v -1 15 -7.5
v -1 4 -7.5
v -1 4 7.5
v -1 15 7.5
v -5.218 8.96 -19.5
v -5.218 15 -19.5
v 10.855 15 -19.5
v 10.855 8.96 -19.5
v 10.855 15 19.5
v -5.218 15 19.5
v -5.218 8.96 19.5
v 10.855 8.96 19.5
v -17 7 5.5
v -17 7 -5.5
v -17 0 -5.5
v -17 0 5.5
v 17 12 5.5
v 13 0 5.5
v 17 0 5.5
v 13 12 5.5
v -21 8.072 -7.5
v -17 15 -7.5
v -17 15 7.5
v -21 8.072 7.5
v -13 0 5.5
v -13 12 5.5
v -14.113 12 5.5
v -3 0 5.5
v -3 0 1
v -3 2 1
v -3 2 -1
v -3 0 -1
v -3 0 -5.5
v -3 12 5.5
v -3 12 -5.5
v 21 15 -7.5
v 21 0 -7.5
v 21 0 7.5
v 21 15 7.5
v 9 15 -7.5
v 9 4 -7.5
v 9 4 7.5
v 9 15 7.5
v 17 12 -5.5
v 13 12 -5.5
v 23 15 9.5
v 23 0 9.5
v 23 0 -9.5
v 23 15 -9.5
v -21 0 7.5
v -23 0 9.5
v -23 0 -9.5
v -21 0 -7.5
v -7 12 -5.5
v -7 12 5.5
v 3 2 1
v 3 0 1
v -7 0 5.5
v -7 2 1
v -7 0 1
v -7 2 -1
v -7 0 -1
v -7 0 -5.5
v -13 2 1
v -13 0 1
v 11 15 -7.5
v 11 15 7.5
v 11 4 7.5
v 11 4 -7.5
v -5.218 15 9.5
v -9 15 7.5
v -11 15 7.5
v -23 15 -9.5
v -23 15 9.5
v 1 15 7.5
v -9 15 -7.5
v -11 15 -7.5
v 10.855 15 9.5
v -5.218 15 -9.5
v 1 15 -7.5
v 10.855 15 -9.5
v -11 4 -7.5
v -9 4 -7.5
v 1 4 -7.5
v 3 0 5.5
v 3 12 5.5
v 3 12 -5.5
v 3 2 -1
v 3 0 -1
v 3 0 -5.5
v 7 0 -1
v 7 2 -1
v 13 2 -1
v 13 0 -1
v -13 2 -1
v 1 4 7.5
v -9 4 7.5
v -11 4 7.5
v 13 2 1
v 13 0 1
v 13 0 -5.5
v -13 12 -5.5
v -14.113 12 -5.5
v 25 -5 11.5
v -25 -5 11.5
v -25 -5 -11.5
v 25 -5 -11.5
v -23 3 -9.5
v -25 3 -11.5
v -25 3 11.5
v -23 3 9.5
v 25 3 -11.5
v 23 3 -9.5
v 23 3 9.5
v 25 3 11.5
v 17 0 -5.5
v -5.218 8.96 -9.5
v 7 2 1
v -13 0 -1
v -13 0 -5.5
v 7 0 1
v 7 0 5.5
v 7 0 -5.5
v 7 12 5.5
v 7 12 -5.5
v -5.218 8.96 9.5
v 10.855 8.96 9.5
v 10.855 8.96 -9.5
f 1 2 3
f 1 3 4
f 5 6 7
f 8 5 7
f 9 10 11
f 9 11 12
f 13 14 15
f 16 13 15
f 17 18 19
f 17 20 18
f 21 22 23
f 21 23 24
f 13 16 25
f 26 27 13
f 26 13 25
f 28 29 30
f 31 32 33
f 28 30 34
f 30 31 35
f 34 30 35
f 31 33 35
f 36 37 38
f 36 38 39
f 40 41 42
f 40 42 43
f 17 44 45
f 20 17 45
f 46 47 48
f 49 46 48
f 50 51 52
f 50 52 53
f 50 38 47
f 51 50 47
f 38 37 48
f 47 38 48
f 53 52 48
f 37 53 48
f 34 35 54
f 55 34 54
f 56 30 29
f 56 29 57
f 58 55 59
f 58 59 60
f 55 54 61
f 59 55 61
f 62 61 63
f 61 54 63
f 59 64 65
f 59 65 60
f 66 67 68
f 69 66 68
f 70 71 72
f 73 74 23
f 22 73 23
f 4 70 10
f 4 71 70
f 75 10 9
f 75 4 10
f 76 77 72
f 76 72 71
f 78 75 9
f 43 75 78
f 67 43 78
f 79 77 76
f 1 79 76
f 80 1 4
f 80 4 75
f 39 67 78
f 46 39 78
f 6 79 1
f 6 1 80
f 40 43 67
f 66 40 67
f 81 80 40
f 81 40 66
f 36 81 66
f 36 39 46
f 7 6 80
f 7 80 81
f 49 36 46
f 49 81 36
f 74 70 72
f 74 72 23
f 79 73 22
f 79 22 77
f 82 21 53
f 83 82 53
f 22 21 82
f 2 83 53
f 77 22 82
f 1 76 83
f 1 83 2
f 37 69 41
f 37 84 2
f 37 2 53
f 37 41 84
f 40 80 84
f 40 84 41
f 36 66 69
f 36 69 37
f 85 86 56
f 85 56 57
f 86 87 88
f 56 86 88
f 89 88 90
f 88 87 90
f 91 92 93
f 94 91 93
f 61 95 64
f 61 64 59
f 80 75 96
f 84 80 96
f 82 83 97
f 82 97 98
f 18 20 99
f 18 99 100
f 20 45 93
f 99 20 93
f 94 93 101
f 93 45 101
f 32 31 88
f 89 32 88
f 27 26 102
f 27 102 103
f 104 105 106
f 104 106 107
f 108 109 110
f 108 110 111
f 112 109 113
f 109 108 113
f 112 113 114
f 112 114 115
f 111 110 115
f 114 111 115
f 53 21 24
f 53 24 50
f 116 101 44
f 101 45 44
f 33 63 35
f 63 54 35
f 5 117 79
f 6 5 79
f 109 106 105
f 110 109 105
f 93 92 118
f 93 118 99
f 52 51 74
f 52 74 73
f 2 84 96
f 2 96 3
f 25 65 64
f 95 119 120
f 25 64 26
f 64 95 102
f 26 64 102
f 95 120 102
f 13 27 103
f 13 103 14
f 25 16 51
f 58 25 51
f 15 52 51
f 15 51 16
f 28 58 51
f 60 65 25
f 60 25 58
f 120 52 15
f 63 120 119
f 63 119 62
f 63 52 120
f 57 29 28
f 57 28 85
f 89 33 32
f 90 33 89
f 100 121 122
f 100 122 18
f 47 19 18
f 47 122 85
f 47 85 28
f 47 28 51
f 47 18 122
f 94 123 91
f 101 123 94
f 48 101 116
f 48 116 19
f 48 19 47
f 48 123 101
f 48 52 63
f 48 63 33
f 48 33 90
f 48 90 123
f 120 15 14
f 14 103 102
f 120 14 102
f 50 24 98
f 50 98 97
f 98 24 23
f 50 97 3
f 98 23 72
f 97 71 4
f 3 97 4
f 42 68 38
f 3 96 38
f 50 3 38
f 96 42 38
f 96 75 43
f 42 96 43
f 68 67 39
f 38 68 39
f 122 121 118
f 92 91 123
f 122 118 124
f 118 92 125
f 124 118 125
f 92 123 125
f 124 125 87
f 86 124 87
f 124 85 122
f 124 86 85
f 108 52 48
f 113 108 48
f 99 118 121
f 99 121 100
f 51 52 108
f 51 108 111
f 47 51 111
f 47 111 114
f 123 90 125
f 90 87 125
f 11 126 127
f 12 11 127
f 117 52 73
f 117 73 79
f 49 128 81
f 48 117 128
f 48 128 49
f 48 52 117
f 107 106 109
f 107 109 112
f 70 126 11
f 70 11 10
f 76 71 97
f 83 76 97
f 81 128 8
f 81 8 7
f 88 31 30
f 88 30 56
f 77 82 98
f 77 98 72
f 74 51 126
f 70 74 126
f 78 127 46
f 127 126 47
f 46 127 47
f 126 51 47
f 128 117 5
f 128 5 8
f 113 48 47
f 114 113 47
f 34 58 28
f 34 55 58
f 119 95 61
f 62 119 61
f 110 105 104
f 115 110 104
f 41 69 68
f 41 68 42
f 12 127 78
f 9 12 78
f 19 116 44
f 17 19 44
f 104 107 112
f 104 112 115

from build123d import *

# Parameters (mm, degrees)
BOSS_EXTRUDE1_DEPTH      = 7.5
BOSS_EXTRUDE1_DEPTH_BACK = 7.5
CUT_EXTRUDE1_DEPTH       = 5.5
CUT_EXTRUDE1_DEPTH_BACK  = 5.5
SKETCH2_W                = 4
SKETCH2_H                = 12
SKETCH3_W                = 34
SKETCH3_H                = 2
CUT_EXTRUDE2_DEPTH       = 2
BOSS_EXTRUDE2_DEPTH      = 15
BOSS_EXTRUDE2_DEPTH_BACK = 5
SKETCH4_W                = 46
SKETCH4_H                = 19
SPLIT1_START             = -5
SPLIT1_OUTLINE_W         = 46
SPLIT1_OUTLINE_H         = 19
SPLIT1_DEPTH             = 5
SPLIT1_2_OUTLINE_W       = 4
SPLIT1_2_OUTLINE_H       = 11
SPLIT1_2_DEPTH           = 12
SPLIT1_3_OUTLINE_W       = 6
SPLIT1_3_OUTLINE_H       = 2
SPLIT1_3_DEPTH           = 2
SPLIT1_START_2           = -5.5
SPLIT1_4_DEPTH           = 11
SPLIT1_START_3           = -9.5
SPLIT1_5_OUTLINE_W       = 46
SPLIT1_5_OUTLINE_H       = 5
SPLIT1_5_DEPTH           = 19
SPLIT1_START_4           = -1
SPLIT1_6_OUTLINE_W       = 6
SPLIT1_6_OUTLINE_H       = 2
SPLIT1_6_DEPTH           = 2
SKETCH5_W                = 16.073439162
SKETCH5_H                = 6.039622656
BOSS_EXTRUDE3_DEPTH      = 10
SKETCH6_W                = 50
SKETCH6_H                = 23
SKETCH6_W_2              = 46
SKETCH6_H_2              = 19
BOSS_EXTRUDE4_DEPTH      = 8


# Read off the part's stored shape, not the designer's step: Split1
with BuildPart() as part:
    # Sketch1 → Boss-Extrude1 (new, two sides: drawn at the far end of the back side and taken through both)
    with BuildSketch(Plane.XY.offset(-BOSS_EXTRUDE1_DEPTH_BACK)):
        Polygon((-21, 0), (21, 0), (21, 15), (11, 15), (11, 4), (9, 4), (9, 15), (1, 15), (1, 4), (-1, 4), (-1, 15), (-9, 15), (-9, 4), (-11, 4), (-11, 15), (-17, 15), (-21, 8.07179677), align=None)
    extrude(amount=BOSS_EXTRUDE1_DEPTH + BOSS_EXTRUDE1_DEPTH_BACK)

    # Sketch2 → Cut-Extrude1 (cut, two sides: drawn at the far end of the back side and taken through both)
    with BuildSketch(Plane.XY.offset(-CUT_EXTRUDE1_DEPTH_BACK)):
        with Locations((15, 6)):
            Rectangle(SKETCH2_W, SKETCH2_H)
        Polygon((-13, 12), (-13, 0), (-17, 0), (-17, 7), (-14.113248654, 12), align=None)
        with Locations((-5, 6)):
            Rectangle(SKETCH2_W, SKETCH2_H)
        with Locations((5, 6)):
            Rectangle(SKETCH2_W, SKETCH2_H)
    extrude(amount=CUT_EXTRUDE1_DEPTH + CUT_EXTRUDE1_DEPTH_BACK, mode=Mode.SUBTRACT)

    # Sketch3 → Cut-Extrude2 (cut)
    with BuildSketch(Plane(origin=(0, 0, 0), x_dir=(-1, 0, 0), z_dir=(0, -1, 0))):
        Rectangle(SKETCH3_W, SKETCH3_H)
    extrude(amount=-CUT_EXTRUDE2_DEPTH, mode=Mode.SUBTRACT)


with BuildPart() as body_2:
    # Sketch4 → Boss-Extrude2 (new, two sides: drawn at the far end of the back side and taken through both)
    with BuildSketch(Plane(origin=(0, 0, 0), x_dir=(1, 0, 0), z_dir=(0, 1, 0)).offset(-BOSS_EXTRUDE2_DEPTH_BACK)):
        Rectangle(SKETCH4_W, SKETCH4_H)
    extrude(amount=BOSS_EXTRUDE2_DEPTH + BOSS_EXTRUDE2_DEPTH_BACK)

    # Combine1: cut part
    add(part.part, mode=Mode.SUBTRACT)

    # Split1 outline → Split1 (cut)
    with BuildSketch(Plane(origin=(0, 0, 0), x_dir=(1, 0, 0), z_dir=(0, 1, 0)).offset(SPLIT1_START)):
        Rectangle(SPLIT1_OUTLINE_W, SPLIT1_OUTLINE_H)
    extrude(amount=SPLIT1_DEPTH, mode=Mode.SUBTRACT)

    # Split1 2 outline → Split1 2 (cut)
    with BuildSketch(Plane(origin=(0, 0, 0), x_dir=(1, 0, 0), z_dir=(0, 1, 0))):
        with Locations((-15, 0)):
            Rectangle(SPLIT1_2_OUTLINE_W, SPLIT1_2_OUTLINE_H)
        with Locations((-5, 0)):
            Rectangle(SPLIT1_2_OUTLINE_W, SPLIT1_2_OUTLINE_H)
        with Locations((5, 0)):
            Rectangle(SPLIT1_2_OUTLINE_W, SPLIT1_2_OUTLINE_H)
        with Locations((15, 0)):
            Rectangle(SPLIT1_2_OUTLINE_W, SPLIT1_2_OUTLINE_H)
    extrude(amount=SPLIT1_2_DEPTH, mode=Mode.SUBTRACT)

    # Split1 3 outline → Split1 3 (cut)
    with BuildSketch(Plane(origin=(0, 0, 0), x_dir=(1, 0, 0), z_dir=(0, 1, 0))):
        with Locations((-10, 0)):
            Rectangle(SPLIT1_3_OUTLINE_W, SPLIT1_3_OUTLINE_H)
        Rectangle(SPLIT1_3_OUTLINE_W, SPLIT1_3_OUTLINE_H)
        with Locations((10, 0)):
            Rectangle(SPLIT1_3_OUTLINE_W, SPLIT1_3_OUTLINE_H)
    extrude(amount=SPLIT1_3_DEPTH, mode=Mode.SUBTRACT)

    # Sketch5 → Boss-Extrude3 (add)
    with BuildSketch(Plane.XY.offset(9.5)):
        with Locations((2.818305229, 11.980188672)):
            Rectangle(SKETCH5_W, SKETCH5_H)
    boss_extrude3 = extrude(amount=BOSS_EXTRUDE3_DEPTH)

    # Mirror1: Boss-Extrude3 across plane
    add(boss_extrude3.mirror(Plane.XY))


with BuildPart() as body_2_2:
    # Split1 4 outline → Split1 4 (new body)
    with BuildSketch(Plane.XY.offset(SPLIT1_START_2)):
        Polygon((17, 0), (17, 12), (13, 12), (13, 0), (7, 0), (7, 12), (3, 12), (3, 0), (-3, 0), (-3, 12), (-7, 12), (-7, 0), (-13, 0), (-13, 12), (-14.113248654, 12), (-17, 7), (-17, 0), (-23, 0), (-23, -5), (23, -5), (23, 0), align=None)
    extrude(amount=SPLIT1_4_DEPTH)

    # Split1 5 outline → Split1 5 (add)
    with BuildSketch(Plane.XY.offset(SPLIT1_START_3)):
        with Locations((0, -2.5)):
            Rectangle(SPLIT1_5_OUTLINE_W, SPLIT1_5_OUTLINE_H)
    extrude(amount=SPLIT1_5_DEPTH)

    # Split1 6 outline → Split1 6 (add)
    with BuildSketch(Plane.XY.offset(SPLIT1_START_4)):
        with Locations((10, 1)):
            Rectangle(SPLIT1_6_OUTLINE_W, SPLIT1_6_OUTLINE_H)
        with Locations((0, 1)):
            Rectangle(SPLIT1_6_OUTLINE_W, SPLIT1_6_OUTLINE_H)
        with Locations((-10, 1)):
            Rectangle(SPLIT1_6_OUTLINE_W, SPLIT1_6_OUTLINE_H)
    extrude(amount=SPLIT1_6_DEPTH)


with BuildPart() as body_3:
    # Sketch6 → Boss-Extrude4 (new body)
    with BuildSketch(Plane.XZ.offset(5)):
        Rectangle(SKETCH6_W, SKETCH6_H)
        Rectangle(SKETCH6_W_2, SKETCH6_H_2, mode=Mode.SUBTRACT)
    extrude(amount=-BOSS_EXTRUDE4_DEPTH)


with BuildPart() as body_2_2_1:
    add(body_2_2.part)

    # Combine2: union body 3
    add(body_3.part)


solid = Compound([body_2.part, body_2_2_1.part])
